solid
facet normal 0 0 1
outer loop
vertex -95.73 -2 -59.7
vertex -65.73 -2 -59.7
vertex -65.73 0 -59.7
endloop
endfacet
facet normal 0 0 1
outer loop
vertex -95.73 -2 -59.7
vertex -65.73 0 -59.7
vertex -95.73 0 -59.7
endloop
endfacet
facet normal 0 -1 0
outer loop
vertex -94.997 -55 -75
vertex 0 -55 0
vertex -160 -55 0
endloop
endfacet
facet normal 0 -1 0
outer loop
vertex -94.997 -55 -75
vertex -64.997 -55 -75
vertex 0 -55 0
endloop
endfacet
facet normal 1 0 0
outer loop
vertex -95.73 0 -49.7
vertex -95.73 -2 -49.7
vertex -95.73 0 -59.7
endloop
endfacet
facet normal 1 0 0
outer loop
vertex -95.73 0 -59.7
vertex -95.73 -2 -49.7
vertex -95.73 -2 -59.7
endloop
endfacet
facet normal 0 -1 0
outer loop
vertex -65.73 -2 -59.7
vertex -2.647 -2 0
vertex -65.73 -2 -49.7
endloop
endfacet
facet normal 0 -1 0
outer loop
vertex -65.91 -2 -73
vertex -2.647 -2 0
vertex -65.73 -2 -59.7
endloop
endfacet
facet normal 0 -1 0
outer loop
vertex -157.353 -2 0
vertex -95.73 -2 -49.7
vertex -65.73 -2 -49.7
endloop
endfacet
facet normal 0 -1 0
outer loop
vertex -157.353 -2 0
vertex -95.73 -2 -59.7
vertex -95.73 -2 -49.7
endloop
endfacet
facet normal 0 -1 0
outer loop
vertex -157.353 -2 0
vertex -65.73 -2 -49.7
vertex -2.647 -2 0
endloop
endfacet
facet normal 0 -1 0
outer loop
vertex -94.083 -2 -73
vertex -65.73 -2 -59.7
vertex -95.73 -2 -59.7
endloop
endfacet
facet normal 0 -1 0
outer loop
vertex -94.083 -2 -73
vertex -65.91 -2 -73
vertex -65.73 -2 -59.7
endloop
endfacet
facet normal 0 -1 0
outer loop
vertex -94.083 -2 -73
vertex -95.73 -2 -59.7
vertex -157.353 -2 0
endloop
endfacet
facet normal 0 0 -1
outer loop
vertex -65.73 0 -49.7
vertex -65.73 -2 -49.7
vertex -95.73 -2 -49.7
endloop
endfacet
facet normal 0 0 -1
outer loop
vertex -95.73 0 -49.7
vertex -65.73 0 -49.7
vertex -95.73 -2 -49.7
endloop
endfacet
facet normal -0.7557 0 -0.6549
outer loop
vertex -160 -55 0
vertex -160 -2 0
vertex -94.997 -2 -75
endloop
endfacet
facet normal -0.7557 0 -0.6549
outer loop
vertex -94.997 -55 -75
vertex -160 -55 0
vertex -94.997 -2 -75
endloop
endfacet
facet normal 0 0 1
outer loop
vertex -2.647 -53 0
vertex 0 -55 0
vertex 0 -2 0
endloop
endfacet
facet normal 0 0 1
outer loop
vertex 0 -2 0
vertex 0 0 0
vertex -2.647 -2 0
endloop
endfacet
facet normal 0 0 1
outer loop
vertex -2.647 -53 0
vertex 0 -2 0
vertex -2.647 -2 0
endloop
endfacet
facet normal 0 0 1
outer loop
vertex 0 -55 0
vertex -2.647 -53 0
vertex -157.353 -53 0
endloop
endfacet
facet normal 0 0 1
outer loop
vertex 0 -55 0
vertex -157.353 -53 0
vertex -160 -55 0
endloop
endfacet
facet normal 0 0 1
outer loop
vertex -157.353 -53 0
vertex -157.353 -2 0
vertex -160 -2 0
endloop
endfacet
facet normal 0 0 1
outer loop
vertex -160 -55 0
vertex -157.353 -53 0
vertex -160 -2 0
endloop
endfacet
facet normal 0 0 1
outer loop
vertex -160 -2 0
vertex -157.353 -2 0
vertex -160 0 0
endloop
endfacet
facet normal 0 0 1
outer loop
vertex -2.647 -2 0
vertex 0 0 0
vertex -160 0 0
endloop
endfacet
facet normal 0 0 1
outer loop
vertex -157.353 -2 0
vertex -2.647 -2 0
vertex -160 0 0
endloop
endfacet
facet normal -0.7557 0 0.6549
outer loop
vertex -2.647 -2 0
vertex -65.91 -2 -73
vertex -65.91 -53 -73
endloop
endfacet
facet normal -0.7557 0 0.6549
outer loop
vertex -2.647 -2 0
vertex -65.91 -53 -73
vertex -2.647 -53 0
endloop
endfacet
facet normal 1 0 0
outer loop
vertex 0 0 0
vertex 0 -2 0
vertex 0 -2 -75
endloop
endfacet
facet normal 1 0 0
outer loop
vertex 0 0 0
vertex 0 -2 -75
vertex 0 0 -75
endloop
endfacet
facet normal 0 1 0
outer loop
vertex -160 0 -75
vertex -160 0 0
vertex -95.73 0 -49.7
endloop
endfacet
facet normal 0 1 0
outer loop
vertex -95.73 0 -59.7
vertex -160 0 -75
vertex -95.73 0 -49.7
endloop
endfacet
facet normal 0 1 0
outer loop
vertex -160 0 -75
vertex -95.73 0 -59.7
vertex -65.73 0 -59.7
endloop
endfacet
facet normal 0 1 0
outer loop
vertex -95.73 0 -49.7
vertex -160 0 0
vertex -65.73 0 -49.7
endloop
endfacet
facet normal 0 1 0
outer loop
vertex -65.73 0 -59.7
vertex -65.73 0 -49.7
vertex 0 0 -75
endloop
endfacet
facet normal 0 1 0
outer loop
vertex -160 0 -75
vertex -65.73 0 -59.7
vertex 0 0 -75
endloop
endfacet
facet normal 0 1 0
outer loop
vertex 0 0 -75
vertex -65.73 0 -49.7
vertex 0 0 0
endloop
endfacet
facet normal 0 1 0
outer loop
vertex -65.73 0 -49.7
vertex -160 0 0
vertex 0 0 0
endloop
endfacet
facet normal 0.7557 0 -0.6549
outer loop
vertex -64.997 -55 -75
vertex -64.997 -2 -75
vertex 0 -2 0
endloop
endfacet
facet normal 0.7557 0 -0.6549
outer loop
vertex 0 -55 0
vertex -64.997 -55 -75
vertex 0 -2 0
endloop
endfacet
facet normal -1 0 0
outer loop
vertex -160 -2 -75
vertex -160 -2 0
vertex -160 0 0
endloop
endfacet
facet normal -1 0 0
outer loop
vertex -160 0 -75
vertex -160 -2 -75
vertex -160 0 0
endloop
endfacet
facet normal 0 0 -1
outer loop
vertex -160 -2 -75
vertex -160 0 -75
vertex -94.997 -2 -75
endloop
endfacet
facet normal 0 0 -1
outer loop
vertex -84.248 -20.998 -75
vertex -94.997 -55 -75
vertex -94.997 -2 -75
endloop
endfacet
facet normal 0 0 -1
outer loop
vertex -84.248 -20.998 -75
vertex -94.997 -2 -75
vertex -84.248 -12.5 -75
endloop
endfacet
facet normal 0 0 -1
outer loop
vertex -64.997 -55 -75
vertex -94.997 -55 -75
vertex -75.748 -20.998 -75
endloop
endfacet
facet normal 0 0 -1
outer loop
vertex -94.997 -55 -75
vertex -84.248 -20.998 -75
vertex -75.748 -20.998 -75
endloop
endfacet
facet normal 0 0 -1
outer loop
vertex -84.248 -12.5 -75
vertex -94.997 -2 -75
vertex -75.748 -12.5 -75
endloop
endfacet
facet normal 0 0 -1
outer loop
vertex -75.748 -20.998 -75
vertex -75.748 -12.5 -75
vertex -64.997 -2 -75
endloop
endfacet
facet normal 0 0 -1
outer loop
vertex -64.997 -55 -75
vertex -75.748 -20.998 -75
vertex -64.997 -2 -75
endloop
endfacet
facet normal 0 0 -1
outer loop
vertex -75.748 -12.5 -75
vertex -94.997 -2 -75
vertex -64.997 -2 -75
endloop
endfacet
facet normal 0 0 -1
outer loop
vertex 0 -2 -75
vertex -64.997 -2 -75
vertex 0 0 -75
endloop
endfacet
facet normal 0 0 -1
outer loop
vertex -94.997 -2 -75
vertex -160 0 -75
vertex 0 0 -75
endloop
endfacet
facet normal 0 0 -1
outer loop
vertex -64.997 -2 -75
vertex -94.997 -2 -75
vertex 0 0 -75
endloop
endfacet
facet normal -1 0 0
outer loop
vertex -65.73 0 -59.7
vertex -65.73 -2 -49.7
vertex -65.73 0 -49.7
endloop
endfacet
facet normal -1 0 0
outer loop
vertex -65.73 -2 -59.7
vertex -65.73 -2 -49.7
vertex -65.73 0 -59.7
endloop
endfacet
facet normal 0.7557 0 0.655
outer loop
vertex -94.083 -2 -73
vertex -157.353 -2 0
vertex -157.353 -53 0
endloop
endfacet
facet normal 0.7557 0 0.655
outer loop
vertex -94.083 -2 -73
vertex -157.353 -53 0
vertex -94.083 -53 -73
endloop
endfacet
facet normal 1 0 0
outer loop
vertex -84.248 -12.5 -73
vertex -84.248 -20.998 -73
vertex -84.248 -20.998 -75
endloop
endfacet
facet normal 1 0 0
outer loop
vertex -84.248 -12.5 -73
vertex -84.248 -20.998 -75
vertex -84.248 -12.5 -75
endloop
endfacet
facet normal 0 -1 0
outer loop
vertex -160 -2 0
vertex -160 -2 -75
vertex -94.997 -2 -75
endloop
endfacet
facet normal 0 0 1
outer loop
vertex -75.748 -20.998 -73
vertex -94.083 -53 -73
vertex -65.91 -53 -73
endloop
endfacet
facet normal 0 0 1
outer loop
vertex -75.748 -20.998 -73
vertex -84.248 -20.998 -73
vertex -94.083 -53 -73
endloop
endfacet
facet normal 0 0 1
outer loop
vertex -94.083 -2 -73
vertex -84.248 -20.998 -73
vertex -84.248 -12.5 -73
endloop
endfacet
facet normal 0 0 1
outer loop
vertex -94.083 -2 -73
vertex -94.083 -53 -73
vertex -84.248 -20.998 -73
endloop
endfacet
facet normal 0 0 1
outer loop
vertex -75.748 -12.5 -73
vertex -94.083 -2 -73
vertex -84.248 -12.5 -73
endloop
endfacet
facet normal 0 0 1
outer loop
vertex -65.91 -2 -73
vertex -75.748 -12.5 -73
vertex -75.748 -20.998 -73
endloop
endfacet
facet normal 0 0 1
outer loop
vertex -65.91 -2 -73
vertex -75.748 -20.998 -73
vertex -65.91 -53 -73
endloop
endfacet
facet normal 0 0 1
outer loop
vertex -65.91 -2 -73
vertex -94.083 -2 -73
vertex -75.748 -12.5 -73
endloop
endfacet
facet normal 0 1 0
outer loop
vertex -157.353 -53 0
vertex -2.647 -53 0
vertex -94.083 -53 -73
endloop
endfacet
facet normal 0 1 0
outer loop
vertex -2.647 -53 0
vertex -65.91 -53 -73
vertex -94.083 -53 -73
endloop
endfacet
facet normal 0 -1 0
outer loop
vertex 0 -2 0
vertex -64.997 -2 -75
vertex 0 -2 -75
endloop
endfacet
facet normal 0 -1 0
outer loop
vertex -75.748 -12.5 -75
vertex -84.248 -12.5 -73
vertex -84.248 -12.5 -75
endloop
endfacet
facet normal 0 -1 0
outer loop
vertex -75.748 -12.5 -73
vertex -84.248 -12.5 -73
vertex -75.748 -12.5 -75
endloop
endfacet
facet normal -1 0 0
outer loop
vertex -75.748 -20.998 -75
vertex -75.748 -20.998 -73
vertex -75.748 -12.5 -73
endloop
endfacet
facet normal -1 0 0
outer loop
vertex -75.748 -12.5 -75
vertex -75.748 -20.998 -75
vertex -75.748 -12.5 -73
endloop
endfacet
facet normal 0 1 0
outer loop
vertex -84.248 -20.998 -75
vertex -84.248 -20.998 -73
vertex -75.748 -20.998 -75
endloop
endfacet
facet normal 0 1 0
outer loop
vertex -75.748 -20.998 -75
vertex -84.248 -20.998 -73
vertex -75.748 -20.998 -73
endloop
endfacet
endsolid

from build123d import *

# Parameters (mm, degrees)
BOSS_EXTRUDE1_DEPTH = 55
SHELL1_T            = -2
SKETCH6_W           = 30
SKETCH6_H           = 10.709947061
CUT_EXTRUDE3_DEPTH  = 4
SKETCH5_W           = 8.5
SKETCH5_H           = 8.497801987
CUT_EXTRUDE5_DEPTH  = 6
SKETCH10_W          = 160
SKETCH10_H          = 2
BOSS_EXTRUDE2_DEPTH = 75
SKETCH11_W          = 30
SKETCH11_H          = 10
CUT_EXTRUDE6_DEPTH  = 8


with BuildPart() as part:
    # Sketch1 → Boss-Extrude1 (new body)
    with BuildSketch(Plane(origin=(0, 0, 0), x_dir=(1, 0, 0), z_dir=(0, 1, 0))):
        Polygon((0, 0), (-160, 0), (-94.996692416, 75), (-64.996692416, 75), align=None)
    extrude(amount=-BOSS_EXTRUDE1_DEPTH)

    # Shell1
    shell1_openings = [part.faces().sort_by_distance(p)[0] for p in [
        (-80, -27.5, 0),
    ]]
    offset(amount=SHELL1_T, openings=shell1_openings, kind=Kind.INTERSECTION)

    # Sketch6 → Cut-Extrude3 (cut)
    with BuildSketch(Plane(origin=(0, 0, 0), x_dir=(1, 0, 0), z_dir=(0, 1, 0))):
        with Locations((-80.447039031, 51.579276021)):
            Rectangle(SKETCH6_W, SKETCH6_H)
    extrude(amount=-CUT_EXTRUDE3_DEPTH, mode=Mode.SUBTRACT)

    # Sketch5 → Cut-Extrude5 (cut)
    with BuildSketch(Plane.XY.offset(-73)):
        with Locations((-79.998465085, -16.748900994)):
            Rectangle(SKETCH5_W, SKETCH5_H)
    extrude(amount=-CUT_EXTRUDE5_DEPTH, mode=Mode.SUBTRACT)

    # Sketch10 → Boss-Extrude2 (add)
    with BuildSketch(Plane.XY):
        with Locations((-80, -1)):
            Rectangle(SKETCH10_W, SKETCH10_H)
    extrude(amount=-BOSS_EXTRUDE2_DEPTH)

    # Sketch11 → Cut-Extrude6 (cut)
    with BuildSketch(Plane(origin=(0, -2, 0), x_dir=(-1, 0, 0), z_dir=(0, -1, 0))):
        with Locations((80.729529252, 54.69995574)):
            Rectangle(SKETCH11_W, SKETCH11_H)
    extrude(amount=-CUT_EXTRUDE6_DEPTH, mode=Mode.SUBTRACT)


solid = part.part
